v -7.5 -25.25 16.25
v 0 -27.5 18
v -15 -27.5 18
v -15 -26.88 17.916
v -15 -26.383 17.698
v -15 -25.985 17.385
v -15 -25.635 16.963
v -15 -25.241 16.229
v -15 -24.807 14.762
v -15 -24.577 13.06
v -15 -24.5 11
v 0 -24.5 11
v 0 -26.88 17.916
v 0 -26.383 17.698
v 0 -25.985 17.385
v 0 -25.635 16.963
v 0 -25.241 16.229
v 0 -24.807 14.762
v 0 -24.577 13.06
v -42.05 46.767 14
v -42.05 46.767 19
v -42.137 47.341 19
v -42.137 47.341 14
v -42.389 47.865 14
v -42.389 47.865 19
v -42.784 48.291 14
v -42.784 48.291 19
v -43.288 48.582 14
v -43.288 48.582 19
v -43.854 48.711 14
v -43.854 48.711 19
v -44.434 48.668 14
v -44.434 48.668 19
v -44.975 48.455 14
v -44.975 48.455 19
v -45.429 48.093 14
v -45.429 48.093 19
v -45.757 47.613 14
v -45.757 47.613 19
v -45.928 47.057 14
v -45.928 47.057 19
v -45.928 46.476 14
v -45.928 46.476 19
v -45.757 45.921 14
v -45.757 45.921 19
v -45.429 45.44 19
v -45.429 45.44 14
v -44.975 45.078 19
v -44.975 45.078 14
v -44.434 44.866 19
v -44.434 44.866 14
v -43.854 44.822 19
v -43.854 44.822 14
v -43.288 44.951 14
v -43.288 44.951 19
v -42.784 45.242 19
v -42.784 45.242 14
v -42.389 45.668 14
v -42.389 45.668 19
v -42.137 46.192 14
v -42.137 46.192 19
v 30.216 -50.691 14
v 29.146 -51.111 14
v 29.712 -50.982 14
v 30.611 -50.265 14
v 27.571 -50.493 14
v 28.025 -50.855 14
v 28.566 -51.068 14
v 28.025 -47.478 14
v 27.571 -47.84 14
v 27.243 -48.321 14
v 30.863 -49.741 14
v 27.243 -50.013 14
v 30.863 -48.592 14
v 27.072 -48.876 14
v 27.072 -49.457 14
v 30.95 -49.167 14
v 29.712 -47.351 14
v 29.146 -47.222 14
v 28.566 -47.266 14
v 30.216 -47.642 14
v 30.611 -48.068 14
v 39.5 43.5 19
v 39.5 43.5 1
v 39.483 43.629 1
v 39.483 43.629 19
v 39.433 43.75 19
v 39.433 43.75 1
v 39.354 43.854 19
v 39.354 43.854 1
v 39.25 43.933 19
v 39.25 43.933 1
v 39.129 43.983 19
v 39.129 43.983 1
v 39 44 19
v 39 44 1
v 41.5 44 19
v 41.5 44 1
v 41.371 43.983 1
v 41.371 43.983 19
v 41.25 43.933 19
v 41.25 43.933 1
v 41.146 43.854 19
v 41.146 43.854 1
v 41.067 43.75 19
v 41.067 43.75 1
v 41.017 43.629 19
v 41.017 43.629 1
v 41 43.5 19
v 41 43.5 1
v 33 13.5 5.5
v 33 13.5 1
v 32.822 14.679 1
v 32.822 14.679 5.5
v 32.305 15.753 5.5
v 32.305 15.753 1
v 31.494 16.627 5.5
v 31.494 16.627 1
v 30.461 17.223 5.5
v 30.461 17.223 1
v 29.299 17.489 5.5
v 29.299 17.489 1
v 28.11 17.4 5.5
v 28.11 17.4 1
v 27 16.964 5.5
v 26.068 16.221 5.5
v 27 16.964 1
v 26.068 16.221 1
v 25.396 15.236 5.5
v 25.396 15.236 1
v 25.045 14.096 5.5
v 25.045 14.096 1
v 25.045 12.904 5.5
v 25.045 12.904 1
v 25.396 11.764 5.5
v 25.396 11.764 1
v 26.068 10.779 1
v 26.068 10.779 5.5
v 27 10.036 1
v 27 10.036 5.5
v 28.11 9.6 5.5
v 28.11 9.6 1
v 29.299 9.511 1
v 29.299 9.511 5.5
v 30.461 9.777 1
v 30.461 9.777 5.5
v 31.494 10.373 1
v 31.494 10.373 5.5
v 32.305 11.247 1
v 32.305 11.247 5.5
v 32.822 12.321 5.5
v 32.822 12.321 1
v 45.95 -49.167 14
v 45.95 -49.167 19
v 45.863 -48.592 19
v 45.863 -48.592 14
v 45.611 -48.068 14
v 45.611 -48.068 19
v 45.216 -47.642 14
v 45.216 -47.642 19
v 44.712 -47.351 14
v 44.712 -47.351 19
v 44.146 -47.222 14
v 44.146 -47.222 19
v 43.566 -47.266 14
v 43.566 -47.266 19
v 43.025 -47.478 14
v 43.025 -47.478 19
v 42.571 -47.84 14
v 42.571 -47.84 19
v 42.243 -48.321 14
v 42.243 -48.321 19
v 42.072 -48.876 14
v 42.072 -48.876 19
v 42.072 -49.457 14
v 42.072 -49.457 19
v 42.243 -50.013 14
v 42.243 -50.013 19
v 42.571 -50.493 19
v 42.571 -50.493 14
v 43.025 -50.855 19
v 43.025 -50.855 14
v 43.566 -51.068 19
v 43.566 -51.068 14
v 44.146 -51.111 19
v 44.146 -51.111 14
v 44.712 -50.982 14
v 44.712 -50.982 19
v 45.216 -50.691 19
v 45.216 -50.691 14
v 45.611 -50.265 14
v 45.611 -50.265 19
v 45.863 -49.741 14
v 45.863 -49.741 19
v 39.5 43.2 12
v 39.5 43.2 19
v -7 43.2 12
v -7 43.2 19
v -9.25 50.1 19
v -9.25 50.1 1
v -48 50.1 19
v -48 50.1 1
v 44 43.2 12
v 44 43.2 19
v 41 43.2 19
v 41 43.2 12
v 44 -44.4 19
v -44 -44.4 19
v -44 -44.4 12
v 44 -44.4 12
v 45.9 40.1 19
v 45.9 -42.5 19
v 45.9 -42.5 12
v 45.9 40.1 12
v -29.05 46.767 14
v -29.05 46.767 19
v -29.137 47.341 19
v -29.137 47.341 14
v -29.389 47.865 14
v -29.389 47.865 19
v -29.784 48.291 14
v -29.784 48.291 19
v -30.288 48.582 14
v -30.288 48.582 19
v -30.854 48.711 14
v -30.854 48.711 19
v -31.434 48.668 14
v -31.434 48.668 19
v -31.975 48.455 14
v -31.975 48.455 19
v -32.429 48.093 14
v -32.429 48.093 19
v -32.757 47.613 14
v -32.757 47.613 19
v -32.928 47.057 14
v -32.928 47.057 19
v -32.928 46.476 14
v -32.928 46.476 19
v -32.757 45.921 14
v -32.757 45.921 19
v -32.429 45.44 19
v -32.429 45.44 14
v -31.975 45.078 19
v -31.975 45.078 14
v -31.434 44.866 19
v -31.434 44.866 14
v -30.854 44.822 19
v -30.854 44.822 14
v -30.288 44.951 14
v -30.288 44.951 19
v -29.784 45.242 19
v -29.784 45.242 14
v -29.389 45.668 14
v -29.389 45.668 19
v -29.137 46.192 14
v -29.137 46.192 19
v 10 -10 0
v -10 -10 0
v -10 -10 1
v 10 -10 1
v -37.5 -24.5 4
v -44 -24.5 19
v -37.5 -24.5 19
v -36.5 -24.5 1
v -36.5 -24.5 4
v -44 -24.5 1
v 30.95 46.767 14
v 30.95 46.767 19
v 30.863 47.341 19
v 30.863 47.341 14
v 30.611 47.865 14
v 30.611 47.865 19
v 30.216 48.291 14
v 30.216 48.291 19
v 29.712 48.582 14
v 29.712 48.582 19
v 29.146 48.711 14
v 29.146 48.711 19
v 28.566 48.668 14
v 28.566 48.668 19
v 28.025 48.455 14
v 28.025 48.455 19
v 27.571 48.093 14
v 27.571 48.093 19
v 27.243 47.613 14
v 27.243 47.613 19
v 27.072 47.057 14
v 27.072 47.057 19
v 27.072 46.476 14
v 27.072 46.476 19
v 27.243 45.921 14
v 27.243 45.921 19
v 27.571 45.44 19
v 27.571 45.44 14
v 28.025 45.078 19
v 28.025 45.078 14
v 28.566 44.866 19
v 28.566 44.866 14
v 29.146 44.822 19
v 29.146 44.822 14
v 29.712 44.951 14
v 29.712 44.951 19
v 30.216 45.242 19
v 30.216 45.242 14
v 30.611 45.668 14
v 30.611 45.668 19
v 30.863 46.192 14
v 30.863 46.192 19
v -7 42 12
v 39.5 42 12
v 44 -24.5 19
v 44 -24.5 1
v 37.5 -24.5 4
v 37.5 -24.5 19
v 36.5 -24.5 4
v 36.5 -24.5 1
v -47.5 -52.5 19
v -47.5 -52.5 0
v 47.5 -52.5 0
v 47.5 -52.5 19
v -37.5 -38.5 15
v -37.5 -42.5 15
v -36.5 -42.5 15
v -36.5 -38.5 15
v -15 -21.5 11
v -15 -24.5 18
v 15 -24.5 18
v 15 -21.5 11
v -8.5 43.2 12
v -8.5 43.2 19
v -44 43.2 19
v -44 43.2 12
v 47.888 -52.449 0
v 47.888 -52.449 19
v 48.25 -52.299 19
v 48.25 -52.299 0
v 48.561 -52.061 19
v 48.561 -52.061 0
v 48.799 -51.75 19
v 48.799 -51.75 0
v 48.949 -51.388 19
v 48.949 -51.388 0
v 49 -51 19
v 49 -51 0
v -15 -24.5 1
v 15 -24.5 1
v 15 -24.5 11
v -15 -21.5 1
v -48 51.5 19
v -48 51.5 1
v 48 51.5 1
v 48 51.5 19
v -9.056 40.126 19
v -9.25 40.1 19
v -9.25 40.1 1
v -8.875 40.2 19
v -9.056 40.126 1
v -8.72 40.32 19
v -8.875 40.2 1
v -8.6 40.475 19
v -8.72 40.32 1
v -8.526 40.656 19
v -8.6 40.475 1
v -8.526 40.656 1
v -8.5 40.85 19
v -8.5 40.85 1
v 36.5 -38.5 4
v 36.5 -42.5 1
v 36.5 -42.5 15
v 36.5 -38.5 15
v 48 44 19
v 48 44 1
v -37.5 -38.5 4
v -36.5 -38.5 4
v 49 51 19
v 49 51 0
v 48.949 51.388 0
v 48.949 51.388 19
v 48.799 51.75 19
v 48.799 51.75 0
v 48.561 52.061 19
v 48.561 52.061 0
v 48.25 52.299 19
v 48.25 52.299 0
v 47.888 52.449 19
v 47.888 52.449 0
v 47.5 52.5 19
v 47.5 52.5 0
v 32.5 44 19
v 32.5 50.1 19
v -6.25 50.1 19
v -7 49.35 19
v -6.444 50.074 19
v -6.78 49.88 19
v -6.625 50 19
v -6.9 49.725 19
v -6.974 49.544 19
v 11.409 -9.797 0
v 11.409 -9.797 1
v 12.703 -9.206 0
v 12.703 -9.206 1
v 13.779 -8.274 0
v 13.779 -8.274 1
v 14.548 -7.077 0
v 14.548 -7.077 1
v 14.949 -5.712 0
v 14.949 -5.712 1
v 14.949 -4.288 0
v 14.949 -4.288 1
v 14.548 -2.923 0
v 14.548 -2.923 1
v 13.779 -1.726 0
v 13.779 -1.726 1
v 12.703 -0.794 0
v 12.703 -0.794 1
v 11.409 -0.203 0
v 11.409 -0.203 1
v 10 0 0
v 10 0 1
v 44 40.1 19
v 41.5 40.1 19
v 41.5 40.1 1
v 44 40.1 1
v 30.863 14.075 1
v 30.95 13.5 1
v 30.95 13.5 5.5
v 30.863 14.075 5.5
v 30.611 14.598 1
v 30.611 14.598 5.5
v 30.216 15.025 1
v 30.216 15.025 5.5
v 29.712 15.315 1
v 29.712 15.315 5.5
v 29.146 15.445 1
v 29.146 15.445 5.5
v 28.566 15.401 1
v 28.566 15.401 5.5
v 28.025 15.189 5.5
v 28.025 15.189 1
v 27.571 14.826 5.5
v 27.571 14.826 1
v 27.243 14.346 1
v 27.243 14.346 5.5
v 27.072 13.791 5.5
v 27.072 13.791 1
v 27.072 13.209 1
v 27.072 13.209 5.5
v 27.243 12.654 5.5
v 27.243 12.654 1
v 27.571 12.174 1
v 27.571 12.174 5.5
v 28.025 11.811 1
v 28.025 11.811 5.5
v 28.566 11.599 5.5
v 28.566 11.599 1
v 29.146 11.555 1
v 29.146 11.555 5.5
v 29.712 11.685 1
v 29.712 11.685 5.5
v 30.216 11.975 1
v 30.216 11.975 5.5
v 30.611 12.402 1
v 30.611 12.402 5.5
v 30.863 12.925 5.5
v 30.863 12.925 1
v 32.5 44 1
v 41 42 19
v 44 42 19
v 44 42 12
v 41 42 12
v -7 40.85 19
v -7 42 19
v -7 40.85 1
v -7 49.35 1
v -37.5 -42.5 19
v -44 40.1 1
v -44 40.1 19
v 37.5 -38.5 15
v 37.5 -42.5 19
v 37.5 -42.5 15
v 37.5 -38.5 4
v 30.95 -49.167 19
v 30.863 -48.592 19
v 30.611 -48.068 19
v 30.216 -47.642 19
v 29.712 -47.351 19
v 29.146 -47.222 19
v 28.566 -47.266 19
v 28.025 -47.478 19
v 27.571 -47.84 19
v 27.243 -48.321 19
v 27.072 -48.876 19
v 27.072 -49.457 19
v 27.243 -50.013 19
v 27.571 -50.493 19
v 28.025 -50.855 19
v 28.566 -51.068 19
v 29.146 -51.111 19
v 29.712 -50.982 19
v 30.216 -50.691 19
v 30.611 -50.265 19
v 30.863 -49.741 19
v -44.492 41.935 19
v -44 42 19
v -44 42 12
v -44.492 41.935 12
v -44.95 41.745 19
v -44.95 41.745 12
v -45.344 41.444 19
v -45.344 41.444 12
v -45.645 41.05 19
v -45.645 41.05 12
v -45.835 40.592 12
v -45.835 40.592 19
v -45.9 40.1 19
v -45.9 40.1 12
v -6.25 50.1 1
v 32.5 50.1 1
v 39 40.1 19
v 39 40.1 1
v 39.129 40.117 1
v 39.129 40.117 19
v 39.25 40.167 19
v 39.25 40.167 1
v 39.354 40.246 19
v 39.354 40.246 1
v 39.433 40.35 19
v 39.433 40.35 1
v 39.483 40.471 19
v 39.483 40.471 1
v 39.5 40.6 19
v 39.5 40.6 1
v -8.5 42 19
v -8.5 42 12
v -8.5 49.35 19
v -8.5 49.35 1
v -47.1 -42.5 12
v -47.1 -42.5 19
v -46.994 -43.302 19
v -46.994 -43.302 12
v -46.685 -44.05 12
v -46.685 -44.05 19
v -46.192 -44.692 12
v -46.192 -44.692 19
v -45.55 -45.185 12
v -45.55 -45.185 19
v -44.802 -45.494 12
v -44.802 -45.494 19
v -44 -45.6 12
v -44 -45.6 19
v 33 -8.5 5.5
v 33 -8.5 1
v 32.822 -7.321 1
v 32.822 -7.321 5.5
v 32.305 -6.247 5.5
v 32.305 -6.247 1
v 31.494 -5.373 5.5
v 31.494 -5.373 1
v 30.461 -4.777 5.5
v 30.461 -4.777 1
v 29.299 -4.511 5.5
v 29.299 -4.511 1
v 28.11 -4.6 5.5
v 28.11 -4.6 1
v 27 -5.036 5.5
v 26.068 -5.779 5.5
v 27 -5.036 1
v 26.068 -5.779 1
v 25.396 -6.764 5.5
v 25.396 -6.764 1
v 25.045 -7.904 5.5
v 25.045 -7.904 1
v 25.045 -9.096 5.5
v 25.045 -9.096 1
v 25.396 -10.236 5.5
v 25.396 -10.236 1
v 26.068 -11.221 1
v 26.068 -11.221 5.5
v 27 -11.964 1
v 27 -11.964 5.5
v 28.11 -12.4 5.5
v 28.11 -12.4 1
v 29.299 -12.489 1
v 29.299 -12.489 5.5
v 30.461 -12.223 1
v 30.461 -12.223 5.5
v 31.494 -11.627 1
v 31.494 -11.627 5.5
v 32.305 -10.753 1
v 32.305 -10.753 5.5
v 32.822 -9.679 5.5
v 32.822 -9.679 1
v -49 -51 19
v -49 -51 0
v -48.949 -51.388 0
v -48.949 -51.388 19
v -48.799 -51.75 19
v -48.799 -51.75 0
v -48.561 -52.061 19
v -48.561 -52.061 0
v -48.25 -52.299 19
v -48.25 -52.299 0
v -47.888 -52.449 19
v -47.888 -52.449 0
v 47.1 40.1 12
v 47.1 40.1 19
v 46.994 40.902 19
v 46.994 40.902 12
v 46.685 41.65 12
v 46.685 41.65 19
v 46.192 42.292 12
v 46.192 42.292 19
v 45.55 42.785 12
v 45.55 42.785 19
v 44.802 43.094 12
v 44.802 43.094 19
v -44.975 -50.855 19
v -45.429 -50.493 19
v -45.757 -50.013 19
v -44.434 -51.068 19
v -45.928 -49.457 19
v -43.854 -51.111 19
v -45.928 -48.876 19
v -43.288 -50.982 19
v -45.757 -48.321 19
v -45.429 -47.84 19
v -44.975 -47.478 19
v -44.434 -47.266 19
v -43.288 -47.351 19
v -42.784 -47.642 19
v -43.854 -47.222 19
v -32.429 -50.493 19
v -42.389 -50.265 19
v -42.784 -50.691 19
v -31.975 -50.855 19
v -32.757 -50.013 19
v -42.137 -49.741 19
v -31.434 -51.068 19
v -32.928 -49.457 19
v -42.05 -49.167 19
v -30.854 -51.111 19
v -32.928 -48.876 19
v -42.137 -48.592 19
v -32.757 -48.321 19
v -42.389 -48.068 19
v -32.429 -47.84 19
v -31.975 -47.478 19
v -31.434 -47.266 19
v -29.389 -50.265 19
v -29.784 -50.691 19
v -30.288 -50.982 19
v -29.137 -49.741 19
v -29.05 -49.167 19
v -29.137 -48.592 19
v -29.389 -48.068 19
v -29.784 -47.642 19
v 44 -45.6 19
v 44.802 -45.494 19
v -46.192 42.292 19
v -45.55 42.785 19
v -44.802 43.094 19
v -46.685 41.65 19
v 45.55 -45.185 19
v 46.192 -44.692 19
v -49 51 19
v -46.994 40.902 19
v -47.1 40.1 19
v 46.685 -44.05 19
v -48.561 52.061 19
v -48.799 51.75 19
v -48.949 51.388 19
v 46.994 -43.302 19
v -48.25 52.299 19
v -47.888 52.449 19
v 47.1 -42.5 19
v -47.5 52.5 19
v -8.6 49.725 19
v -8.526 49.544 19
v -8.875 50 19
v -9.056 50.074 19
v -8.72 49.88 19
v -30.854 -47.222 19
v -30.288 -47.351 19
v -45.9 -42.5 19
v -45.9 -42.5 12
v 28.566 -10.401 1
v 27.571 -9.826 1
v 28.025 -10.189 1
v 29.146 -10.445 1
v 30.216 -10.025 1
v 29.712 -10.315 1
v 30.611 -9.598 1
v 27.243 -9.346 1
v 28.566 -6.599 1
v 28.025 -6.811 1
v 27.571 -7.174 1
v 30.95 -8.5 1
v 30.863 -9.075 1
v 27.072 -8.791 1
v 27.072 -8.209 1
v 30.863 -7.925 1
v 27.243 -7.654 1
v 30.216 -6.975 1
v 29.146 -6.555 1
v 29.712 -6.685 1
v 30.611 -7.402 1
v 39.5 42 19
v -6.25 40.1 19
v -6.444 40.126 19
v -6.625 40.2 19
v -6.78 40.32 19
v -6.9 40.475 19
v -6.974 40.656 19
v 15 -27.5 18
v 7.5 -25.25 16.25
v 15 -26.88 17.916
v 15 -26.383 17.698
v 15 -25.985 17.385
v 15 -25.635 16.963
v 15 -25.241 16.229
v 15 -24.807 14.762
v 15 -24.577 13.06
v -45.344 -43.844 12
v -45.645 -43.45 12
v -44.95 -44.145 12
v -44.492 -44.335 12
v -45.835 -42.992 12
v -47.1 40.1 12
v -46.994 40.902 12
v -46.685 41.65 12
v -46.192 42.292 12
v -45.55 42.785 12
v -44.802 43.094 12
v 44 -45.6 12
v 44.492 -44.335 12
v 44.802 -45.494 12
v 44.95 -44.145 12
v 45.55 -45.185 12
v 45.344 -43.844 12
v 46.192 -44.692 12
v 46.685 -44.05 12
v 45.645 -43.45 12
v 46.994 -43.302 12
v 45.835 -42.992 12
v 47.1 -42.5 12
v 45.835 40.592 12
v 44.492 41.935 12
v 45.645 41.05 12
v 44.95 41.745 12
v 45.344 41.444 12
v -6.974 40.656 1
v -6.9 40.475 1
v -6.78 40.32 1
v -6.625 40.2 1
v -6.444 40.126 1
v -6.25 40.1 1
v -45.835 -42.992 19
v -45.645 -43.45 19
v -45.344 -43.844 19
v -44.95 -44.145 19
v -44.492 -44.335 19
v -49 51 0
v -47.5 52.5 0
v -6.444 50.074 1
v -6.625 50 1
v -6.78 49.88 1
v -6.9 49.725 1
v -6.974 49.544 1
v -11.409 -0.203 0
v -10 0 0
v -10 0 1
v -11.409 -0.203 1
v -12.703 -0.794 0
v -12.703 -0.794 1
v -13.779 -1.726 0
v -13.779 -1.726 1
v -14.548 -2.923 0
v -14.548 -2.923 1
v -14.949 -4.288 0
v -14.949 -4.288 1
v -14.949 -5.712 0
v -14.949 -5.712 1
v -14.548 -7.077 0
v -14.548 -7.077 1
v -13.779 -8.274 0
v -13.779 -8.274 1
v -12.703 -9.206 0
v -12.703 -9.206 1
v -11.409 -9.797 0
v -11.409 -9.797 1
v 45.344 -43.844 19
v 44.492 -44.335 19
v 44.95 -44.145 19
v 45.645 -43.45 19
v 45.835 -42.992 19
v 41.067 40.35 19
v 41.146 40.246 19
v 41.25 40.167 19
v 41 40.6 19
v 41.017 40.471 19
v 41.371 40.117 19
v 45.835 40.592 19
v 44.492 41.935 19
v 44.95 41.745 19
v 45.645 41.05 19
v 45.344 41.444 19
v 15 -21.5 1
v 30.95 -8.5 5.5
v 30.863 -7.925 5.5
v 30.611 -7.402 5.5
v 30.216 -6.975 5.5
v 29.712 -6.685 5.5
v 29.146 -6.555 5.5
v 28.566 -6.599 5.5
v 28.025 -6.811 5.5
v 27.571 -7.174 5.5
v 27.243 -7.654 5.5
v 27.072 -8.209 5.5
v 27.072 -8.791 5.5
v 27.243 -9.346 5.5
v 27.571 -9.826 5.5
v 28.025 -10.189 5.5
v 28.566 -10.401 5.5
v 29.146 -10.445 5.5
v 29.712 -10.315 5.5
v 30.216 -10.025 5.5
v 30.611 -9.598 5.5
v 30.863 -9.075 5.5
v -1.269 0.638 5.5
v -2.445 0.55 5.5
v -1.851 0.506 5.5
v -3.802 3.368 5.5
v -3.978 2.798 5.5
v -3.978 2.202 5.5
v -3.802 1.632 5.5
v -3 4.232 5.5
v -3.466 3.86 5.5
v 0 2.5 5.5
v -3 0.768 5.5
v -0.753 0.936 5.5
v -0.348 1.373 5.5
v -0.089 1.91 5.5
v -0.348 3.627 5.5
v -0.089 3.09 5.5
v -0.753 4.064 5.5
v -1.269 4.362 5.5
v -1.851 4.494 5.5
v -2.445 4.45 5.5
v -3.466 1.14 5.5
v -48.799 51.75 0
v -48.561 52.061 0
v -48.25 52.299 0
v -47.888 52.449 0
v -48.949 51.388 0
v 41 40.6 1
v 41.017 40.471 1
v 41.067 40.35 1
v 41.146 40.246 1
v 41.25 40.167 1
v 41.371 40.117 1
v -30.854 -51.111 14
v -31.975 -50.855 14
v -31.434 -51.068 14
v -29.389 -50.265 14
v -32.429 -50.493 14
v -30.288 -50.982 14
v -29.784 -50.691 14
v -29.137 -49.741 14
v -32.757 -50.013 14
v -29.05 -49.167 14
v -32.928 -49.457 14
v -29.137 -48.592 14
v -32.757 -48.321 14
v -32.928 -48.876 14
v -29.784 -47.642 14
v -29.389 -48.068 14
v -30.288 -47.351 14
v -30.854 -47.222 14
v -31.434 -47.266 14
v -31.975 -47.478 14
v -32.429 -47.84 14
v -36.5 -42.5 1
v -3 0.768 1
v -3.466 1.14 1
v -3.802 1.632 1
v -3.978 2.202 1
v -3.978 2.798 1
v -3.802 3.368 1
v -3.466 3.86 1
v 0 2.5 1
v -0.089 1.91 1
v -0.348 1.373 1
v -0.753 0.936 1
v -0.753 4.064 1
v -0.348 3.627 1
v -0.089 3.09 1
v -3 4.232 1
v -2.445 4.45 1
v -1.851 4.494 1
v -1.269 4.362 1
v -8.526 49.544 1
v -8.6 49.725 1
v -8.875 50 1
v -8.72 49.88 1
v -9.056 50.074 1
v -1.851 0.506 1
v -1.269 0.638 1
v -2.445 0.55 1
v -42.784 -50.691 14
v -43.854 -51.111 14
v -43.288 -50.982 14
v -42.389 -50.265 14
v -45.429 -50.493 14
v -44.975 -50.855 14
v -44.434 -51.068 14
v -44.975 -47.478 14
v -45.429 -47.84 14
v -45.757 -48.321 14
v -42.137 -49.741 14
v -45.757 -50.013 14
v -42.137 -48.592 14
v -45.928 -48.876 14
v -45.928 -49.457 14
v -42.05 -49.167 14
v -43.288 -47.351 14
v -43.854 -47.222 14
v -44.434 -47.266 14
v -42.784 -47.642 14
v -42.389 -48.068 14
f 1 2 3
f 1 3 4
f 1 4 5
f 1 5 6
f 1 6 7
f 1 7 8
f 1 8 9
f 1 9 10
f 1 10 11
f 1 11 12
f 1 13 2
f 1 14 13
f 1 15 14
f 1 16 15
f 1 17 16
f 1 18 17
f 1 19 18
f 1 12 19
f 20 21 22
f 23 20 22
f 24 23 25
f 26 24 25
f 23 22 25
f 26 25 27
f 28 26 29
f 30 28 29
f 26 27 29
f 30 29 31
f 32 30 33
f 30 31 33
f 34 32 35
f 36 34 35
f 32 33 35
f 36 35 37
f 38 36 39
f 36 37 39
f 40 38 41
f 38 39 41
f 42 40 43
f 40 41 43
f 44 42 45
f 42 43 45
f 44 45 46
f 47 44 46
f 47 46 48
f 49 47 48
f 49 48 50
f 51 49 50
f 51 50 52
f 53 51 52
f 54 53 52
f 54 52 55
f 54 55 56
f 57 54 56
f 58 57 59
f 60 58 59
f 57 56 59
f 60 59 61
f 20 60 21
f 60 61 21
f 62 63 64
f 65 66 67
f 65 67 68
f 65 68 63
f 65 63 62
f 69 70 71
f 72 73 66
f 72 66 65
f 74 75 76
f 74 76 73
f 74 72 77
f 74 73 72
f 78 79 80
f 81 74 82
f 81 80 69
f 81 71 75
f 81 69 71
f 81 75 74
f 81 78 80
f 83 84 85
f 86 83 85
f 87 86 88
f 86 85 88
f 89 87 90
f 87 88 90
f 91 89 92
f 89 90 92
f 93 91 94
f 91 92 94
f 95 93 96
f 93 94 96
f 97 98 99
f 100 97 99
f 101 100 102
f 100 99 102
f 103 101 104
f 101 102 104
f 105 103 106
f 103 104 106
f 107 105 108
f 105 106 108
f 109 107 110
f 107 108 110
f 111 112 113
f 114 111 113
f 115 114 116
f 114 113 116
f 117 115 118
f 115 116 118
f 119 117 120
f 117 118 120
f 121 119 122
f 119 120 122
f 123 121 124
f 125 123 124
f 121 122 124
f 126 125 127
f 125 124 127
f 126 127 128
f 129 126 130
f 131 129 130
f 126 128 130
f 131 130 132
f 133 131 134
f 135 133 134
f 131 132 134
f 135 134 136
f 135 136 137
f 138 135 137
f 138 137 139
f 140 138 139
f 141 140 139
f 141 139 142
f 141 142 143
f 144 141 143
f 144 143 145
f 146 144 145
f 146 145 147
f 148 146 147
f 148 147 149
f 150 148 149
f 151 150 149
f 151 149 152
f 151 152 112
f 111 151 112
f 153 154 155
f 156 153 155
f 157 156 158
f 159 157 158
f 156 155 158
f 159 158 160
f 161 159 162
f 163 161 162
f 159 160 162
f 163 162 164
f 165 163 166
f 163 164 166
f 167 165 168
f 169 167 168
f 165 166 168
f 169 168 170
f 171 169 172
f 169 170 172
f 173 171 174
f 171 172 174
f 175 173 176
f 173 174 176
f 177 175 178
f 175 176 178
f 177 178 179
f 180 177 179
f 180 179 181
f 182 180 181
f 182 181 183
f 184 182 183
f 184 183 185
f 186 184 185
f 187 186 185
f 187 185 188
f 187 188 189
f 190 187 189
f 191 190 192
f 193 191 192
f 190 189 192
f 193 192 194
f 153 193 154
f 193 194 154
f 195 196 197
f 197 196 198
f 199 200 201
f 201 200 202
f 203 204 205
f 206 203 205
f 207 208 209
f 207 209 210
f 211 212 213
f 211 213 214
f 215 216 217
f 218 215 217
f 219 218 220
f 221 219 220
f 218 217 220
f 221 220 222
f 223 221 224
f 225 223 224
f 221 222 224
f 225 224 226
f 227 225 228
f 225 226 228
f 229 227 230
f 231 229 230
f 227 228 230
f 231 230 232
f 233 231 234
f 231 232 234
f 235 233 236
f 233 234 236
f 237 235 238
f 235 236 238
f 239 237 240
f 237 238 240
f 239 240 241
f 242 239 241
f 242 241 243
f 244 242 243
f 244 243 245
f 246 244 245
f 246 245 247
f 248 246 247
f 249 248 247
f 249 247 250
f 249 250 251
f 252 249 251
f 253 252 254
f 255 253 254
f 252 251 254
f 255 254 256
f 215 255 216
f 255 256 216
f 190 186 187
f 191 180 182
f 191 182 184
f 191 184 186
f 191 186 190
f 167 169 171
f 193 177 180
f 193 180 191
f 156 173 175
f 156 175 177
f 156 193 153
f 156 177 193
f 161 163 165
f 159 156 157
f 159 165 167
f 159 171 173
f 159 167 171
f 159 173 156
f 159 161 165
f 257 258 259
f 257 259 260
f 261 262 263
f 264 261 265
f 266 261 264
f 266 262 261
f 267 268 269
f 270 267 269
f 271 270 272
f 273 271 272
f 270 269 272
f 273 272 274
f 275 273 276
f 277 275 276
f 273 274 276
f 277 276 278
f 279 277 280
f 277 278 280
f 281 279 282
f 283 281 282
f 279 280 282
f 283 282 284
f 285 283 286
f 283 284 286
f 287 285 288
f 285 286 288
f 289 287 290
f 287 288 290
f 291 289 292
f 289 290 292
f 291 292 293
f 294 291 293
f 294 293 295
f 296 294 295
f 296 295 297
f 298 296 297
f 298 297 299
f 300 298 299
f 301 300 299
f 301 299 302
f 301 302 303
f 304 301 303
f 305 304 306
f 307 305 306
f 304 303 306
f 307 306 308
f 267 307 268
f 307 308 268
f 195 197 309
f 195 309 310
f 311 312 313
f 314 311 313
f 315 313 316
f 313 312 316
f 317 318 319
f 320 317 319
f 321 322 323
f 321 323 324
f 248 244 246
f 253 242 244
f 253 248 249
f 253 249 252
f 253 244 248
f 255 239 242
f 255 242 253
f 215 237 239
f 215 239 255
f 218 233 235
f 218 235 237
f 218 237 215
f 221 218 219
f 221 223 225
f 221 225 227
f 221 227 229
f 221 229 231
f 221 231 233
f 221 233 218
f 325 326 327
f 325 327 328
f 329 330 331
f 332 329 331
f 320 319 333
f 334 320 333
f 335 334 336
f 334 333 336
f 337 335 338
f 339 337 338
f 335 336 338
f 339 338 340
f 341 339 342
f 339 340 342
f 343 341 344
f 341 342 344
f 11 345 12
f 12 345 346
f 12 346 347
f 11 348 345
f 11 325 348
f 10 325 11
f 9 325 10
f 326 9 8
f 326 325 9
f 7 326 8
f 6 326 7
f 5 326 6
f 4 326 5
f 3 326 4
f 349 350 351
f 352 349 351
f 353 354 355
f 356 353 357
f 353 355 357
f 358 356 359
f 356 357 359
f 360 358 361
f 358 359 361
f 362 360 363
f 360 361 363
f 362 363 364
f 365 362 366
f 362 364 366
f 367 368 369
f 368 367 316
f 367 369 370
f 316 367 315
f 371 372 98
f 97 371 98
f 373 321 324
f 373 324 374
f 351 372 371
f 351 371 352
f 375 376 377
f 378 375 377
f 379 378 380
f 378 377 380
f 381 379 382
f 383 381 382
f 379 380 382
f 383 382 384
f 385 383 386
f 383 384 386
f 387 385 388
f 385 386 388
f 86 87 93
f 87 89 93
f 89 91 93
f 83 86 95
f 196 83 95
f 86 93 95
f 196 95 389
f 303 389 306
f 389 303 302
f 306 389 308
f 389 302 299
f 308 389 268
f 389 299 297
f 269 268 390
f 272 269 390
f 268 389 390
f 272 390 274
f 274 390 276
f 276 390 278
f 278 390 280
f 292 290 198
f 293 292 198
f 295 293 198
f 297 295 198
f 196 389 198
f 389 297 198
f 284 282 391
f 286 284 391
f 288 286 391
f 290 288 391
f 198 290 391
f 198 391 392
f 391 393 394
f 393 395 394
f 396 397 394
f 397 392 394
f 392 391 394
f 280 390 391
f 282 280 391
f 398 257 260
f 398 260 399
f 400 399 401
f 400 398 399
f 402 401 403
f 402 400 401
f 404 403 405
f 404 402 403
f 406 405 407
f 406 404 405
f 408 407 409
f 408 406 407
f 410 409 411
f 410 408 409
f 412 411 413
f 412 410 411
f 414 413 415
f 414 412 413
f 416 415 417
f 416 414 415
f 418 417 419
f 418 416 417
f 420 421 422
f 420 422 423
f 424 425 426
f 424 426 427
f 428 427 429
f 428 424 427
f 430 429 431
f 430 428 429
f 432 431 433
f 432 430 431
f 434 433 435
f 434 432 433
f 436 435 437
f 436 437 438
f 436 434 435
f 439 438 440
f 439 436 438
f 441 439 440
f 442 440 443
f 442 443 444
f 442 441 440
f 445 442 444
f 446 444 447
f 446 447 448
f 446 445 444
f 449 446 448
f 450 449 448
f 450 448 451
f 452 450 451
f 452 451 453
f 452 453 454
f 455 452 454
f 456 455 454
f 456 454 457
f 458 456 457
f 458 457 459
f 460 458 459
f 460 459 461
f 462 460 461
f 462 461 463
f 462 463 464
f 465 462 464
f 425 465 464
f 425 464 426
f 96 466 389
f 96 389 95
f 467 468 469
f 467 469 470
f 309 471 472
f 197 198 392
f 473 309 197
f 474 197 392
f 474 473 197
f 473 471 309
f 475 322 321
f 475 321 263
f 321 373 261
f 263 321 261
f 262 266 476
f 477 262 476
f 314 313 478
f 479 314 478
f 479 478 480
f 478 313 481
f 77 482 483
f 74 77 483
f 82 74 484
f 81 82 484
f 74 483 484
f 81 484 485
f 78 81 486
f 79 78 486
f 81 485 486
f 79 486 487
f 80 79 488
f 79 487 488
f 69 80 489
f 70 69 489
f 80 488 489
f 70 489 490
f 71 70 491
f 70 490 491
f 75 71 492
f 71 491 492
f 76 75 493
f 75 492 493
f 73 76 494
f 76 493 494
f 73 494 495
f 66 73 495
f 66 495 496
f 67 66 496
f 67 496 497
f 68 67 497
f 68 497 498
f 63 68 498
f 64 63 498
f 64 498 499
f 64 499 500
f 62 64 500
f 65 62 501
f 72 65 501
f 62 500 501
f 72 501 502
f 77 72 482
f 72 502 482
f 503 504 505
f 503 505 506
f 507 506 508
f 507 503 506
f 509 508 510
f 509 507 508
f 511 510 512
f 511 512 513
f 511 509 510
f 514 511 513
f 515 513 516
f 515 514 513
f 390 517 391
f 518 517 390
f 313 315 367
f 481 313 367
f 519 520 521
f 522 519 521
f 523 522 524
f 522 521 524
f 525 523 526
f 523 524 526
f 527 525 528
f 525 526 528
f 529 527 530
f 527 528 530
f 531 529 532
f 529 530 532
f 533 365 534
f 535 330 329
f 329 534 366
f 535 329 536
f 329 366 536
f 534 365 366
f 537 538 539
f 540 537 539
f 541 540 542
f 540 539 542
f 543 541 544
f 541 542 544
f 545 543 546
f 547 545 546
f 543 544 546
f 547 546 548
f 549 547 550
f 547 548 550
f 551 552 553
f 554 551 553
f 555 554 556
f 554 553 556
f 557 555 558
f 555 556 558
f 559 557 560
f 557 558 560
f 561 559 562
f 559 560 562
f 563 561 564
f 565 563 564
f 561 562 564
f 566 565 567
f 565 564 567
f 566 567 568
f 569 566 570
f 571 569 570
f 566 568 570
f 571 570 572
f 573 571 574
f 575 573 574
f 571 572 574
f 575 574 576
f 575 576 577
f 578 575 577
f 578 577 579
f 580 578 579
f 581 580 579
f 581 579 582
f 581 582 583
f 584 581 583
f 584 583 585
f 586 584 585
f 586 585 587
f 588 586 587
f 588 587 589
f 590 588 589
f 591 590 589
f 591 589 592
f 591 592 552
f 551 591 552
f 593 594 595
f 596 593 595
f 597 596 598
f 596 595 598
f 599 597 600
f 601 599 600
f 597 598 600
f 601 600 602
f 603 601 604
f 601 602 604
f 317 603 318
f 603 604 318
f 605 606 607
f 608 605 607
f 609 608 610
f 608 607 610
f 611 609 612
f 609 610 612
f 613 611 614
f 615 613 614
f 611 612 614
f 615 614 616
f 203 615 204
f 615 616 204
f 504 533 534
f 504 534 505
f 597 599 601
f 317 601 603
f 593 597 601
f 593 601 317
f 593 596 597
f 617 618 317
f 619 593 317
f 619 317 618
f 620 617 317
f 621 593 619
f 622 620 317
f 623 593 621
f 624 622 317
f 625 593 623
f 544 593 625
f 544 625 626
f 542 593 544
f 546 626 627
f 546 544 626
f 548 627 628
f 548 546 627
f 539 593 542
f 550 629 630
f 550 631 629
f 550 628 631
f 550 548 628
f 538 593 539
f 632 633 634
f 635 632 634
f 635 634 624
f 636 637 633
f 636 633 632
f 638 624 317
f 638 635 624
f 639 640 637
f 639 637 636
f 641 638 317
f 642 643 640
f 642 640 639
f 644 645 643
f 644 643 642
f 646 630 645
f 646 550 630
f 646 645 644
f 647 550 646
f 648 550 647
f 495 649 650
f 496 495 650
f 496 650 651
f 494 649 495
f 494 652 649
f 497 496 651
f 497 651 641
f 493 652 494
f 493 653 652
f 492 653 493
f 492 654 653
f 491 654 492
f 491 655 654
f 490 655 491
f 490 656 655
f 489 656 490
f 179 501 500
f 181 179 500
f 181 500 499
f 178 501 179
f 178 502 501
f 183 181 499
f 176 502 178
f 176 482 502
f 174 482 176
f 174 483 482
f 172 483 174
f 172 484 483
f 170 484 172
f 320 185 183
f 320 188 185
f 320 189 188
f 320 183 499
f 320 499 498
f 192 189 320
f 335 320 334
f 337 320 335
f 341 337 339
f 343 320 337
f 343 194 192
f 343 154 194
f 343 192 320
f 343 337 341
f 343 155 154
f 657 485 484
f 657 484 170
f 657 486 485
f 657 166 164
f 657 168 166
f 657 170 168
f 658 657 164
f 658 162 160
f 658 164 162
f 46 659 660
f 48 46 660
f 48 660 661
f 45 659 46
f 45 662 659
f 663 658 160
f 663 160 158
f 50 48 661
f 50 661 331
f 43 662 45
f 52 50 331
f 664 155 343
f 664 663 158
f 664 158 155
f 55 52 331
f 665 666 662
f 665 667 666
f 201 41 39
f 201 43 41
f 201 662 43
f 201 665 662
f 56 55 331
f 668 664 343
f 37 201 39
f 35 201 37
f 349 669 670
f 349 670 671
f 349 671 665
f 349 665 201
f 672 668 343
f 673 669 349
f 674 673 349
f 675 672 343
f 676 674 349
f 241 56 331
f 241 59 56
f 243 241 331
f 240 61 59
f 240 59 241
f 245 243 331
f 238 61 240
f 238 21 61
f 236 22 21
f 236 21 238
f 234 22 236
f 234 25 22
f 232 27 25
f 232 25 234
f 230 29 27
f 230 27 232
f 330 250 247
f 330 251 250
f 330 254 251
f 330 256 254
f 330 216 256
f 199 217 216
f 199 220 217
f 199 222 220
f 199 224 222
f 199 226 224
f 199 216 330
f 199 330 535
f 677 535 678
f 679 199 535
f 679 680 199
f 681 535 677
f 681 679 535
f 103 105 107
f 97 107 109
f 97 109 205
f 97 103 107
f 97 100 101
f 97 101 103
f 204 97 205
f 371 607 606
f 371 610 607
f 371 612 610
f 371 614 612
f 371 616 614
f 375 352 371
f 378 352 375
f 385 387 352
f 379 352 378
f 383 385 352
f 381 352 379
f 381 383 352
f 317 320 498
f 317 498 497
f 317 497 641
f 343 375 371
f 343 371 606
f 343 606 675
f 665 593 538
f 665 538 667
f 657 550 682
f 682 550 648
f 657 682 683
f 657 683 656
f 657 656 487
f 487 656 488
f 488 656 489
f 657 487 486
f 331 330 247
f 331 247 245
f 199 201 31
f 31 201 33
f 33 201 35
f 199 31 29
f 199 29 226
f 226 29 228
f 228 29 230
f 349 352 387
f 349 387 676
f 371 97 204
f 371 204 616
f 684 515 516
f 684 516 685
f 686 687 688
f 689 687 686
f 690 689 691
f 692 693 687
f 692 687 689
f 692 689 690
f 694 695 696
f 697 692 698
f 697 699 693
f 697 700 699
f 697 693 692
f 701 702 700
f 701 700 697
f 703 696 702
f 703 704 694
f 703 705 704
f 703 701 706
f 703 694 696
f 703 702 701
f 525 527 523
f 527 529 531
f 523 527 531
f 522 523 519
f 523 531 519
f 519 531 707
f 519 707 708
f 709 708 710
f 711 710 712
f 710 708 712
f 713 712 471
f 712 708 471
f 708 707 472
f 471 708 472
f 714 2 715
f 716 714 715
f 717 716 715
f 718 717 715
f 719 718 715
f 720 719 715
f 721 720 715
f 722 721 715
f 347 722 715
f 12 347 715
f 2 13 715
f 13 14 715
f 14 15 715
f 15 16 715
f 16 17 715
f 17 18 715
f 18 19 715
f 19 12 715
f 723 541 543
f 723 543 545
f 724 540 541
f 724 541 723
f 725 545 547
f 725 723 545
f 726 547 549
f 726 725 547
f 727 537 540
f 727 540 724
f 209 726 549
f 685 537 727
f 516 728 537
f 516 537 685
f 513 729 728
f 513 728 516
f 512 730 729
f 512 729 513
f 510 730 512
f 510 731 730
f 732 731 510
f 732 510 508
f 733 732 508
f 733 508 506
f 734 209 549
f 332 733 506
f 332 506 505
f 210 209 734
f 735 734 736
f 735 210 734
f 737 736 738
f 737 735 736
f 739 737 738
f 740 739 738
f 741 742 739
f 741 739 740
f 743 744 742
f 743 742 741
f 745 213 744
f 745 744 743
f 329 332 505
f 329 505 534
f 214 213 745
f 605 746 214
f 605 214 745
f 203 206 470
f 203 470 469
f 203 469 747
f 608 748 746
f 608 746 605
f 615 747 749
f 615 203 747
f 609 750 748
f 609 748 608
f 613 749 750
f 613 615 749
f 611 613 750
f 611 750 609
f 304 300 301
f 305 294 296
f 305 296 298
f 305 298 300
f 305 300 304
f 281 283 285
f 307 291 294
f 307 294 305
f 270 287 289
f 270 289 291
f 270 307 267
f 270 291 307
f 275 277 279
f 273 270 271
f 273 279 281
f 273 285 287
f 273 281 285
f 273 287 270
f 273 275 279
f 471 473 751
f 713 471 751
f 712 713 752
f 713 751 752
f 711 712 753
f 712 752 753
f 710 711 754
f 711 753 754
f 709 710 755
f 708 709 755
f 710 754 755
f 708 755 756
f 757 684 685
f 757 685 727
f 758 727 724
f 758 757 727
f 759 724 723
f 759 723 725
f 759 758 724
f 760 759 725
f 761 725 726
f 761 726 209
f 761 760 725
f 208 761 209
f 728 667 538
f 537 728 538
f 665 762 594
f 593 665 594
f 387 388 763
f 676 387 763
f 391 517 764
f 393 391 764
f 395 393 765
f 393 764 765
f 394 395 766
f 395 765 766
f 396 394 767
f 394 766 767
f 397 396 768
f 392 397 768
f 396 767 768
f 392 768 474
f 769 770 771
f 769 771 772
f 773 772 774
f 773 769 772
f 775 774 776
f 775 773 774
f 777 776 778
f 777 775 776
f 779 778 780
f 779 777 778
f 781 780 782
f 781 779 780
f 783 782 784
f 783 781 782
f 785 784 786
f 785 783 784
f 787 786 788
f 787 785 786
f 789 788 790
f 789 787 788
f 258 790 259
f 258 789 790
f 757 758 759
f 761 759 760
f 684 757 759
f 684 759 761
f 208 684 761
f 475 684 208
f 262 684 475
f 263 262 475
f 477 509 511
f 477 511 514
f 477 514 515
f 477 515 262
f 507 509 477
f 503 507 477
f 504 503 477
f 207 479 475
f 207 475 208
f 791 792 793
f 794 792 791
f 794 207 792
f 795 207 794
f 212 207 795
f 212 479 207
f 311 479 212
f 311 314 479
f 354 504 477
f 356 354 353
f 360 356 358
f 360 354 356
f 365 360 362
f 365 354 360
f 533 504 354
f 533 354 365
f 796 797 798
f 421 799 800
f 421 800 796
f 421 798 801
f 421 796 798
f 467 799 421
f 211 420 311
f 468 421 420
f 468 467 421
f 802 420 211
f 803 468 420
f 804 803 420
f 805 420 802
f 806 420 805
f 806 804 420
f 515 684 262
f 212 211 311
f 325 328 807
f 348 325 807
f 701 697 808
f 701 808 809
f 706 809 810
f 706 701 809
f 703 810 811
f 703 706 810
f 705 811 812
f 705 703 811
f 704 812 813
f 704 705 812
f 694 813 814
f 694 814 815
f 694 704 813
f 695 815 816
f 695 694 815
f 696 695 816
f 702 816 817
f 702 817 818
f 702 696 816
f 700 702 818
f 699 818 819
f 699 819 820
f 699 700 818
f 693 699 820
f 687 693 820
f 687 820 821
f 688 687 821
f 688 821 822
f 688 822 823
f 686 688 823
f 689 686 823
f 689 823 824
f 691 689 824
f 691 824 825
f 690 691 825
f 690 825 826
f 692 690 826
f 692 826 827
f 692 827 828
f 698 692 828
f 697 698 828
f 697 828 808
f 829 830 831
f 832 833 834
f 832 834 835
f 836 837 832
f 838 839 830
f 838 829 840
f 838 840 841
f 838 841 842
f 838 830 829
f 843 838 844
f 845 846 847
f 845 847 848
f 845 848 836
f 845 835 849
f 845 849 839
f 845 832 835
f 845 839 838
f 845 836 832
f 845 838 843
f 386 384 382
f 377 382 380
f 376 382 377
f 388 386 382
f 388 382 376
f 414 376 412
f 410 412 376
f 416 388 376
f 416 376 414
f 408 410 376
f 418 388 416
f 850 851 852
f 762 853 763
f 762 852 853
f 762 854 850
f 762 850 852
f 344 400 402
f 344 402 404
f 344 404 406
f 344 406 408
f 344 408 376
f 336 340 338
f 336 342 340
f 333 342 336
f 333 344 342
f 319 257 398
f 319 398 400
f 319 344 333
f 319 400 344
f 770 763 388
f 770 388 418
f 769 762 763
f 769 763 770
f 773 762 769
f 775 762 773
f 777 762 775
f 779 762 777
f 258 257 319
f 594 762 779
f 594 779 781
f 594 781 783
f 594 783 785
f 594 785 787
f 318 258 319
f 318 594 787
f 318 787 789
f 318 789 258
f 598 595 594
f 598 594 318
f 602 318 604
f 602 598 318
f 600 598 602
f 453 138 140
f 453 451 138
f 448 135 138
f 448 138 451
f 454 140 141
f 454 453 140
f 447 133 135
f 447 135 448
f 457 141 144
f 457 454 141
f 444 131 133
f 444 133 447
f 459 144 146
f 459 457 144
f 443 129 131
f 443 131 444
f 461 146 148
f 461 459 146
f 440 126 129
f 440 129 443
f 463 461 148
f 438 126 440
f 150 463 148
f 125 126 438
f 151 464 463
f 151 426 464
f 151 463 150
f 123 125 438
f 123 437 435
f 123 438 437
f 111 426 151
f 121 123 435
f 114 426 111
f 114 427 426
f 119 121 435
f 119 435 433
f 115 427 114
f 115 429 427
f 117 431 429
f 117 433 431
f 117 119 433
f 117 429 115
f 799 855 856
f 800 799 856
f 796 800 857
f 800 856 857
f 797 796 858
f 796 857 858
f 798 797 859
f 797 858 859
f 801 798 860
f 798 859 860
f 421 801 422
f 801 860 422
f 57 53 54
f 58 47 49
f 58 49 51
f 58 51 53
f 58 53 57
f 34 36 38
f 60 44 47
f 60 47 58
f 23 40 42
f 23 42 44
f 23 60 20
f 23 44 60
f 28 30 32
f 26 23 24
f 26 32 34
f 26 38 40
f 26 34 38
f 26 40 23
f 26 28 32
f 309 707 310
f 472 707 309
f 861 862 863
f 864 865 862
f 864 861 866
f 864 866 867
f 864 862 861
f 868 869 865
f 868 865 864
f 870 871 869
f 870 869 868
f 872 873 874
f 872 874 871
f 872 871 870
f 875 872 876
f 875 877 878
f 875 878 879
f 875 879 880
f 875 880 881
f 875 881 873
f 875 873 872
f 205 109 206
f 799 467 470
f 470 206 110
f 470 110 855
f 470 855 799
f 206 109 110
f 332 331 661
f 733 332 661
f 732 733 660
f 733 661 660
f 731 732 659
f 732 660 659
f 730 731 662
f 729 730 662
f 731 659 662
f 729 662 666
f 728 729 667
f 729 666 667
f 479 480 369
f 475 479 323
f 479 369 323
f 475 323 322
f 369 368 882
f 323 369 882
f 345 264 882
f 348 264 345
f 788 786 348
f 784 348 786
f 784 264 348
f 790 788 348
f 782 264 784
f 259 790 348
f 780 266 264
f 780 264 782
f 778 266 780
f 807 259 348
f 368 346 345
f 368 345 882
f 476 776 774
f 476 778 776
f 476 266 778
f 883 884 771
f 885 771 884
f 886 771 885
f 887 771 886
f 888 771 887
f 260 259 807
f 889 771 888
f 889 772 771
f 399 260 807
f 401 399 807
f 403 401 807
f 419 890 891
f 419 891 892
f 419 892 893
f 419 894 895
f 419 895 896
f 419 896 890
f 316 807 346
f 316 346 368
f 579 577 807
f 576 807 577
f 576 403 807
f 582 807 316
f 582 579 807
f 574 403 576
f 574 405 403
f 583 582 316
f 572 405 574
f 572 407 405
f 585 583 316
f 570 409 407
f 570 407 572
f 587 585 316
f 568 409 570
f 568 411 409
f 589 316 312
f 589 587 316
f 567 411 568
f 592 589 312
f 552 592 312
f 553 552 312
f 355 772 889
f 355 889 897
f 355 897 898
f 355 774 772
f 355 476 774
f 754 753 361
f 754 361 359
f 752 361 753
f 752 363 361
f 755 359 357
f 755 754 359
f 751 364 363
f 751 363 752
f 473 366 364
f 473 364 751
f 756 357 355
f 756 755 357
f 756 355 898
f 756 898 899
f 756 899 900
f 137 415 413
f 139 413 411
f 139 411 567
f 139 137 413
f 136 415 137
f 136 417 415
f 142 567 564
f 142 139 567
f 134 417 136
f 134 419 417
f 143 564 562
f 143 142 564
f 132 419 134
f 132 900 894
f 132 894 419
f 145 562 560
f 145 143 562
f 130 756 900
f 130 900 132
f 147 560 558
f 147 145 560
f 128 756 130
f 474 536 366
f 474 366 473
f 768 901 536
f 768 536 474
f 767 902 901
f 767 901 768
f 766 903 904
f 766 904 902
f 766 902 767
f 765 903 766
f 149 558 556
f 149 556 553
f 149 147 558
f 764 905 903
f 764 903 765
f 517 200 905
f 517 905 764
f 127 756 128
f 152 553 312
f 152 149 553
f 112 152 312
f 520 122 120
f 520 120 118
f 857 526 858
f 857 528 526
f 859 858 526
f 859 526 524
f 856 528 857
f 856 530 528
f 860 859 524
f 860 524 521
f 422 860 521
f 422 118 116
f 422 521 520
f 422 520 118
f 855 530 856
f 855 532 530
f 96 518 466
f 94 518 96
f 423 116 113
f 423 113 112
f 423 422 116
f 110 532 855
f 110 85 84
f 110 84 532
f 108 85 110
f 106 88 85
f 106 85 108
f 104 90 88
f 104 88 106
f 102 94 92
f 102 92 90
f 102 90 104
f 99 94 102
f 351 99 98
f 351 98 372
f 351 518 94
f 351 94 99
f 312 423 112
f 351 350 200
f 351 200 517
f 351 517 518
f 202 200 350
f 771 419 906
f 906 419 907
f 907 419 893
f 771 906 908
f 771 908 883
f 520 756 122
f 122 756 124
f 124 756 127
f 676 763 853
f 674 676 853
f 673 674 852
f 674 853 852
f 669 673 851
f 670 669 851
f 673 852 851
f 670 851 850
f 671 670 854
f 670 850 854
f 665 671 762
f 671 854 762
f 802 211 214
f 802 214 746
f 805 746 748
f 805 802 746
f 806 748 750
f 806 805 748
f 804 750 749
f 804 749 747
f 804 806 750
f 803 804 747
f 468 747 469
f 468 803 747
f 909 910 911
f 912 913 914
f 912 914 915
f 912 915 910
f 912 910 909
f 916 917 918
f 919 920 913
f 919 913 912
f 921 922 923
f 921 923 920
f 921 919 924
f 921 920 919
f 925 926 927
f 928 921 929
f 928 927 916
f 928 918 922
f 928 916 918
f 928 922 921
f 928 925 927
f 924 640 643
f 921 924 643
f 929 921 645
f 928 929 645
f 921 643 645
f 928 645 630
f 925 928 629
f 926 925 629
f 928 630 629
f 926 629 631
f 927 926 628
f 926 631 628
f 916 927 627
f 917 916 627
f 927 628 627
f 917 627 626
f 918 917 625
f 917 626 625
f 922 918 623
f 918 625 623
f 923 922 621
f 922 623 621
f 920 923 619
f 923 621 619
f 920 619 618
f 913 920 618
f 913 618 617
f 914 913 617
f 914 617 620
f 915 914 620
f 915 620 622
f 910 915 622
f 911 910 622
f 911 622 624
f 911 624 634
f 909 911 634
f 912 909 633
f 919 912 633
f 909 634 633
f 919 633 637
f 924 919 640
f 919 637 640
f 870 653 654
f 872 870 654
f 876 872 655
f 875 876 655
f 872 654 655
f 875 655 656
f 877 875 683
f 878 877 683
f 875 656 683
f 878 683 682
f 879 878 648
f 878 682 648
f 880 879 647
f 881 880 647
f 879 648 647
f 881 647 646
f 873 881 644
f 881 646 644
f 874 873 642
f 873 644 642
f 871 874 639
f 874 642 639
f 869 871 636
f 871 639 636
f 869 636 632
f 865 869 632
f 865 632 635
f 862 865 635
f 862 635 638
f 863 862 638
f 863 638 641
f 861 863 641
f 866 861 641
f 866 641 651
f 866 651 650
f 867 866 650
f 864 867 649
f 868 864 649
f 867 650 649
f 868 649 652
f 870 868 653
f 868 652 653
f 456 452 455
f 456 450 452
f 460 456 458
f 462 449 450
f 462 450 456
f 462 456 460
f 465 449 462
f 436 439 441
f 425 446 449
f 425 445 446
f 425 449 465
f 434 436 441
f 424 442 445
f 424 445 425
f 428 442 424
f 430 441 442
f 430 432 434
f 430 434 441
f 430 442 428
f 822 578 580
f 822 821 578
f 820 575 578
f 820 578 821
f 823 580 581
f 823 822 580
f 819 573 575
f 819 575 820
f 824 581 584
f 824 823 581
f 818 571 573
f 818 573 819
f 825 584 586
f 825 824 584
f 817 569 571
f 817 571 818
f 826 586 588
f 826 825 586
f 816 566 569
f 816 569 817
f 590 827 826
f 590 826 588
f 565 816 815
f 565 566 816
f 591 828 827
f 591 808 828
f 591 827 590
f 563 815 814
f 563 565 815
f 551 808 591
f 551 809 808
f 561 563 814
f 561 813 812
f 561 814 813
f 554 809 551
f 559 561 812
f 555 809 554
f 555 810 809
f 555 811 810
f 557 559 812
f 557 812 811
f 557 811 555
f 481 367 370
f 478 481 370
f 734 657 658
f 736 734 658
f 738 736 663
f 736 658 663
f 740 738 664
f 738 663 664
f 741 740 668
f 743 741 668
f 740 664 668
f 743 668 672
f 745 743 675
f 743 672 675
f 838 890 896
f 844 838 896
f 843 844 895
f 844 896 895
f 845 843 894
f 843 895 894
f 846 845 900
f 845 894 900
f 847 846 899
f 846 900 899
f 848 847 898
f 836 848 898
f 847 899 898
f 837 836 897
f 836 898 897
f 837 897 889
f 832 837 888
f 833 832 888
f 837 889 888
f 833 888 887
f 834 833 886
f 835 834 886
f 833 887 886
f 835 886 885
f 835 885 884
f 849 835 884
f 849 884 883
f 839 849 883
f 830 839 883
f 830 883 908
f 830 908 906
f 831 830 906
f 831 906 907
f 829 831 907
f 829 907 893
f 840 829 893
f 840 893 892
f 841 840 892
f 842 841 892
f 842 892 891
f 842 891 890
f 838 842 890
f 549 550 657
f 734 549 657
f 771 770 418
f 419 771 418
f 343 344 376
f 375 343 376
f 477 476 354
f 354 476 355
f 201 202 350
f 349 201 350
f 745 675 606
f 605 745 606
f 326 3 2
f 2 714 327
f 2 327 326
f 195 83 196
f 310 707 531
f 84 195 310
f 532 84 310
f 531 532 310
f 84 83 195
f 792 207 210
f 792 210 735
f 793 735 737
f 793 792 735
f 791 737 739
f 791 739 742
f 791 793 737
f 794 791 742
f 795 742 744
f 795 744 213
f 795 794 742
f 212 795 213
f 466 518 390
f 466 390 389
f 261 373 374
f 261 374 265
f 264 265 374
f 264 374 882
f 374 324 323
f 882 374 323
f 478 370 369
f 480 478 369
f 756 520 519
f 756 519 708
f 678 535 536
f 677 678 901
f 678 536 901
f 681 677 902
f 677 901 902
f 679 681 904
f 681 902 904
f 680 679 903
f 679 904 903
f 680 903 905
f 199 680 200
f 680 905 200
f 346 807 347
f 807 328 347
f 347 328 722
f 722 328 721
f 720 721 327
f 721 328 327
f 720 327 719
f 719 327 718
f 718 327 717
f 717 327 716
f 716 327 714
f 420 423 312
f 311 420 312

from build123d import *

# Parameters (mm, degrees)
PAD_DEPTH       = 1
PAD001_DEPTH    = 19
SKETCH002_R     = 4
SKETCH002_R_2   = 1.95
SKETCH002_R_3   = 2
PAD002_DEPTH    = 5.5
PAD003_DEPTH    = 15
POCKET_DEPTH    = 7
PAD004_DEPTH    = 1
SKETCH007_R     = 1.95
POCKET001_DEPTH = 5
PAD014_DEPTH    = 1


with BuildPart() as part:
    # Sketch → Pad (new body)
    with BuildSketch(Plane.XY):
        with BuildLine():
            Line((-47.5, -52.5), (47.5, -52.5))
            ThreePointArc((47.5, -52.5), (48.56066, -52.06066), (49, -51))
            Line((49, -51), (49, 51))
            ThreePointArc((49, 51), (48.56066, 52.06066), (47.5, 52.5))
            Line((47.5, 52.5), (-47.5, 52.5))
            ThreePointArc((-47.5, 52.5), (-48.56066, 52.06066), (-49, 51))
            Line((-49, 51), (-49, -51))
            ThreePointArc((-49, -51), (-48.56066, -52.06066), (-47.5, -52.5))
        make_face()
        with BuildLine():
            ThreePointArc((-10, 0), (-15, -5), (-10, -10))
            Line((-10, -10), (10, -10))
            ThreePointArc((10, -10), (15, -5), (10, 0))
            Line((-10, 0), (10, 0))
        make_face(mode=Mode.SUBTRACT)
    extrude(amount=PAD_DEPTH)

    # Sketch001 → Pad001 (join)
    with BuildSketch(Plane.XY):
        with BuildLine():
            Line((-47.5, -52.5), (47.5, -52.5))
            ThreePointArc((47.5, -52.5), (48.56066, -52.06066), (49, -51))
            Line((49, -51), (49, 51))
            ThreePointArc((49, 51), (48.56066, 52.06066), (47.5, 52.5))
            Line((47.5, 52.5), (-47.5, 52.5))
            ThreePointArc((-47.5, 52.5), (-48.56066, 52.06066), (-49, 51))
            Line((-49, 51), (-49, -51))
            ThreePointArc((-49, -51), (-48.56066, -52.06066), (-47.5, -52.5))
        make_face()
        with BuildLine():
            Line((44, 40.1), (44, -24.5))
            Line((44, -24.5), (37.5, -24.5))
            Line((37.5, -24.5), (37.5, -42.5))
            Line((37.5, -42.5), (-37.5, -42.5))
            Line((-37.5, -42.5), (-37.5, -24.5))
            Line((-37.5, -24.5), (-44, -24.5))
            Line((-44, -24.5), (-44, 40.1))
            Line((-44, 40.1), (-9.25, 40.1))
            ThreePointArc((-9.25, 40.1), (-8.71967, 40.31967), (-8.5, 40.85))
            Line((-8.5, 40.85), (-8.5, 49.35))
            ThreePointArc((-8.5, 49.35), (-8.71967, 49.88033), (-9.25, 50.1))
            Line((-9.25, 50.1), (-48, 50.1))
            Line((-48, 50.1), (-48, 51.5))
            Line((-48, 51.5), (48, 51.5))
            Line((48, 44), (48, 51.5))
            Line((48, 44), (41.5, 44))
            ThreePointArc((41.5, 44), (41.146447, 43.853553), (41, 43.5))
            Line((41, 43.5), (41, 40.6))
            ThreePointArc((41, 40.6), (41.146447, 40.246447), (41.5, 40.1))
            Line((41.5, 40.1), (44, 40.1))
        make_face(mode=Mode.SUBTRACT)
        with BuildLine():
            Line((-7, 40.85), (-7, 49.35))
            ThreePointArc((-6.25, 50.1), (-6.78033, 49.88033), (-7, 49.35))
            Line((-6.25, 50.1), (32.5, 50.1))
            Line((32.5, 50.1), (32.5, 44))
            Line((32.5, 44), (39, 44))
            ThreePointArc((39.5, 43.5), (39.353553, 43.853553), (39, 44))
            Line((39.5, 43.5), (39.5, 40.6))
            ThreePointArc((39, 40.1), (39.353553, 40.246447), (39.5, 40.6))
            Line((39, 40.1), (-6.25, 40.1))
            ThreePointArc((-7, 40.85), (-6.78033, 40.31967), (-6.25, 40.1))
        make_face()
    extrude(amount=PAD001_DEPTH)

    # Sketch002 → Pad002 (join)
    with BuildSketch(Plane.XY):
        with Locations((29, 13.5)):
            Circle(SKETCH002_R)
        with Locations((29, 13.5)):
            Circle(SKETCH002_R_2, mode=Mode.SUBTRACT)
        with Locations((29, -8.5)):
            Circle(SKETCH002_R)
        with Locations((29, -8.5)):
            Circle(SKETCH002_R_2, mode=Mode.SUBTRACT)
        with Locations((-2, 2.5)):
            Circle(SKETCH002_R_3)
    extrude(amount=PAD002_DEPTH)

    # Sketch003 → Pad003 (join, symmetric)
    with BuildSketch(Plane.YZ):
        with BuildLine():
            Line((-24.5, 0), (-24.5, 11))
            add(Edge.make_bspline(
                [(-27.5, 18), (-24.5, 18), (-24.5, 11)],
                knots=[0, 0, 0, 1, 1, 1], degree=2))
            Line((-27.5, 18), (-24.5, 18))
            Line((-24.5, 18), (-21.5, 11))
            Line((-21.5, 11), (-21.5, 0))
            Line((-21.5, 0), (-24.5, 0))
        make_face()
    extrude(amount=PAD003_DEPTH, both=True)

    # Sketch004 (on Face14 of Pad003) → Pocket (cut)
    with BuildSketch(Plane.XY.offset(19)):
        with BuildLine():
            Line((47.1, -42.5), (47.1, 40.1))
            ThreePointArc((47.1, 40.1), (46.192031, 42.292031), (44, 43.2))
            Line((44, 43.2), (-44, 43.2))
            ThreePointArc((-44, 43.2), (-46.192031, 42.292031), (-47.1, 40.1))
            Line((-47.1, 40.1), (-47.1, -42.5))
            ThreePointArc((-47.1, -42.5), (-46.192031, -44.692031), (-44, -45.6))
            Line((-44, -45.6), (44, -45.6))
            ThreePointArc((44, -45.6), (46.192031, -44.692031), (47.1, -42.5))
        make_face()
        with BuildLine():
            Line((45.9, -42.5), (45.9, 40.1))
            ThreePointArc((45.9, 40.1), (45.343503, 41.443503), (44, 42))
            Line((44, 42), (-44, 42))
            ThreePointArc((-44, 42), (-45.343503, 41.443503), (-45.9, 40.1))
            Line((-45.9, 40.1), (-45.9, -42.5))
            ThreePointArc((-45.9, -42.5), (-45.343503, -43.843503), (-44, -44.4))
            Line((-44, -44.4), (44, -44.4))
            ThreePointArc((44, -44.4), (45.343503, -43.843503), (45.9, -42.5))
        make_face(mode=Mode.SUBTRACT)
    extrude(amount=-POCKET_DEPTH, mode=Mode.SUBTRACT)

    # Sketch005 → Pad004 (join)
    with BuildSketch(Plane.YZ.offset(36.5)):
        Polygon((-24.5, 0), (-24.5, 4), (-38.5, 4), (-38.5, 15), (-42.5, 15), (-42.5, 0), align=None)
    extrude(amount=PAD004_DEPTH)

    # Sketch007 (on DatumPlane) → Pocket001 (cut)
    with BuildSketch(Plane.XY.offset(19)):
        with Locations((-44, -49.166667)):
            Circle(SKETCH007_R)
        with Locations((44, -49.166667)):
            Circle(SKETCH007_R)
        with Locations((-44, 46.766667)):
            Circle(SKETCH007_R)
        with Locations((29, 46.766667)):
            Circle(SKETCH007_R)
        with Locations((-31, 46.766667)):
            Circle(SKETCH007_R)
        with Locations((29, -49.166667)):
            Circle(SKETCH007_R)
        with Locations((-31, -49.166667)):
            Circle(SKETCH007_R)
    extrude(amount=-POCKET001_DEPTH, mode=Mode.SUBTRACT)

    # Sketch006 → Pad014 (join)
    with BuildSketch(Plane.YZ.offset(-37.5)):
        Polygon((-42.5, 0), (-42.5, 15), (-38.5, 15), (-38.5, 4), (-24.5, 4), (-24.5, 0), align=None)
    extrude(amount=PAD014_DEPTH)


solid = part.part
